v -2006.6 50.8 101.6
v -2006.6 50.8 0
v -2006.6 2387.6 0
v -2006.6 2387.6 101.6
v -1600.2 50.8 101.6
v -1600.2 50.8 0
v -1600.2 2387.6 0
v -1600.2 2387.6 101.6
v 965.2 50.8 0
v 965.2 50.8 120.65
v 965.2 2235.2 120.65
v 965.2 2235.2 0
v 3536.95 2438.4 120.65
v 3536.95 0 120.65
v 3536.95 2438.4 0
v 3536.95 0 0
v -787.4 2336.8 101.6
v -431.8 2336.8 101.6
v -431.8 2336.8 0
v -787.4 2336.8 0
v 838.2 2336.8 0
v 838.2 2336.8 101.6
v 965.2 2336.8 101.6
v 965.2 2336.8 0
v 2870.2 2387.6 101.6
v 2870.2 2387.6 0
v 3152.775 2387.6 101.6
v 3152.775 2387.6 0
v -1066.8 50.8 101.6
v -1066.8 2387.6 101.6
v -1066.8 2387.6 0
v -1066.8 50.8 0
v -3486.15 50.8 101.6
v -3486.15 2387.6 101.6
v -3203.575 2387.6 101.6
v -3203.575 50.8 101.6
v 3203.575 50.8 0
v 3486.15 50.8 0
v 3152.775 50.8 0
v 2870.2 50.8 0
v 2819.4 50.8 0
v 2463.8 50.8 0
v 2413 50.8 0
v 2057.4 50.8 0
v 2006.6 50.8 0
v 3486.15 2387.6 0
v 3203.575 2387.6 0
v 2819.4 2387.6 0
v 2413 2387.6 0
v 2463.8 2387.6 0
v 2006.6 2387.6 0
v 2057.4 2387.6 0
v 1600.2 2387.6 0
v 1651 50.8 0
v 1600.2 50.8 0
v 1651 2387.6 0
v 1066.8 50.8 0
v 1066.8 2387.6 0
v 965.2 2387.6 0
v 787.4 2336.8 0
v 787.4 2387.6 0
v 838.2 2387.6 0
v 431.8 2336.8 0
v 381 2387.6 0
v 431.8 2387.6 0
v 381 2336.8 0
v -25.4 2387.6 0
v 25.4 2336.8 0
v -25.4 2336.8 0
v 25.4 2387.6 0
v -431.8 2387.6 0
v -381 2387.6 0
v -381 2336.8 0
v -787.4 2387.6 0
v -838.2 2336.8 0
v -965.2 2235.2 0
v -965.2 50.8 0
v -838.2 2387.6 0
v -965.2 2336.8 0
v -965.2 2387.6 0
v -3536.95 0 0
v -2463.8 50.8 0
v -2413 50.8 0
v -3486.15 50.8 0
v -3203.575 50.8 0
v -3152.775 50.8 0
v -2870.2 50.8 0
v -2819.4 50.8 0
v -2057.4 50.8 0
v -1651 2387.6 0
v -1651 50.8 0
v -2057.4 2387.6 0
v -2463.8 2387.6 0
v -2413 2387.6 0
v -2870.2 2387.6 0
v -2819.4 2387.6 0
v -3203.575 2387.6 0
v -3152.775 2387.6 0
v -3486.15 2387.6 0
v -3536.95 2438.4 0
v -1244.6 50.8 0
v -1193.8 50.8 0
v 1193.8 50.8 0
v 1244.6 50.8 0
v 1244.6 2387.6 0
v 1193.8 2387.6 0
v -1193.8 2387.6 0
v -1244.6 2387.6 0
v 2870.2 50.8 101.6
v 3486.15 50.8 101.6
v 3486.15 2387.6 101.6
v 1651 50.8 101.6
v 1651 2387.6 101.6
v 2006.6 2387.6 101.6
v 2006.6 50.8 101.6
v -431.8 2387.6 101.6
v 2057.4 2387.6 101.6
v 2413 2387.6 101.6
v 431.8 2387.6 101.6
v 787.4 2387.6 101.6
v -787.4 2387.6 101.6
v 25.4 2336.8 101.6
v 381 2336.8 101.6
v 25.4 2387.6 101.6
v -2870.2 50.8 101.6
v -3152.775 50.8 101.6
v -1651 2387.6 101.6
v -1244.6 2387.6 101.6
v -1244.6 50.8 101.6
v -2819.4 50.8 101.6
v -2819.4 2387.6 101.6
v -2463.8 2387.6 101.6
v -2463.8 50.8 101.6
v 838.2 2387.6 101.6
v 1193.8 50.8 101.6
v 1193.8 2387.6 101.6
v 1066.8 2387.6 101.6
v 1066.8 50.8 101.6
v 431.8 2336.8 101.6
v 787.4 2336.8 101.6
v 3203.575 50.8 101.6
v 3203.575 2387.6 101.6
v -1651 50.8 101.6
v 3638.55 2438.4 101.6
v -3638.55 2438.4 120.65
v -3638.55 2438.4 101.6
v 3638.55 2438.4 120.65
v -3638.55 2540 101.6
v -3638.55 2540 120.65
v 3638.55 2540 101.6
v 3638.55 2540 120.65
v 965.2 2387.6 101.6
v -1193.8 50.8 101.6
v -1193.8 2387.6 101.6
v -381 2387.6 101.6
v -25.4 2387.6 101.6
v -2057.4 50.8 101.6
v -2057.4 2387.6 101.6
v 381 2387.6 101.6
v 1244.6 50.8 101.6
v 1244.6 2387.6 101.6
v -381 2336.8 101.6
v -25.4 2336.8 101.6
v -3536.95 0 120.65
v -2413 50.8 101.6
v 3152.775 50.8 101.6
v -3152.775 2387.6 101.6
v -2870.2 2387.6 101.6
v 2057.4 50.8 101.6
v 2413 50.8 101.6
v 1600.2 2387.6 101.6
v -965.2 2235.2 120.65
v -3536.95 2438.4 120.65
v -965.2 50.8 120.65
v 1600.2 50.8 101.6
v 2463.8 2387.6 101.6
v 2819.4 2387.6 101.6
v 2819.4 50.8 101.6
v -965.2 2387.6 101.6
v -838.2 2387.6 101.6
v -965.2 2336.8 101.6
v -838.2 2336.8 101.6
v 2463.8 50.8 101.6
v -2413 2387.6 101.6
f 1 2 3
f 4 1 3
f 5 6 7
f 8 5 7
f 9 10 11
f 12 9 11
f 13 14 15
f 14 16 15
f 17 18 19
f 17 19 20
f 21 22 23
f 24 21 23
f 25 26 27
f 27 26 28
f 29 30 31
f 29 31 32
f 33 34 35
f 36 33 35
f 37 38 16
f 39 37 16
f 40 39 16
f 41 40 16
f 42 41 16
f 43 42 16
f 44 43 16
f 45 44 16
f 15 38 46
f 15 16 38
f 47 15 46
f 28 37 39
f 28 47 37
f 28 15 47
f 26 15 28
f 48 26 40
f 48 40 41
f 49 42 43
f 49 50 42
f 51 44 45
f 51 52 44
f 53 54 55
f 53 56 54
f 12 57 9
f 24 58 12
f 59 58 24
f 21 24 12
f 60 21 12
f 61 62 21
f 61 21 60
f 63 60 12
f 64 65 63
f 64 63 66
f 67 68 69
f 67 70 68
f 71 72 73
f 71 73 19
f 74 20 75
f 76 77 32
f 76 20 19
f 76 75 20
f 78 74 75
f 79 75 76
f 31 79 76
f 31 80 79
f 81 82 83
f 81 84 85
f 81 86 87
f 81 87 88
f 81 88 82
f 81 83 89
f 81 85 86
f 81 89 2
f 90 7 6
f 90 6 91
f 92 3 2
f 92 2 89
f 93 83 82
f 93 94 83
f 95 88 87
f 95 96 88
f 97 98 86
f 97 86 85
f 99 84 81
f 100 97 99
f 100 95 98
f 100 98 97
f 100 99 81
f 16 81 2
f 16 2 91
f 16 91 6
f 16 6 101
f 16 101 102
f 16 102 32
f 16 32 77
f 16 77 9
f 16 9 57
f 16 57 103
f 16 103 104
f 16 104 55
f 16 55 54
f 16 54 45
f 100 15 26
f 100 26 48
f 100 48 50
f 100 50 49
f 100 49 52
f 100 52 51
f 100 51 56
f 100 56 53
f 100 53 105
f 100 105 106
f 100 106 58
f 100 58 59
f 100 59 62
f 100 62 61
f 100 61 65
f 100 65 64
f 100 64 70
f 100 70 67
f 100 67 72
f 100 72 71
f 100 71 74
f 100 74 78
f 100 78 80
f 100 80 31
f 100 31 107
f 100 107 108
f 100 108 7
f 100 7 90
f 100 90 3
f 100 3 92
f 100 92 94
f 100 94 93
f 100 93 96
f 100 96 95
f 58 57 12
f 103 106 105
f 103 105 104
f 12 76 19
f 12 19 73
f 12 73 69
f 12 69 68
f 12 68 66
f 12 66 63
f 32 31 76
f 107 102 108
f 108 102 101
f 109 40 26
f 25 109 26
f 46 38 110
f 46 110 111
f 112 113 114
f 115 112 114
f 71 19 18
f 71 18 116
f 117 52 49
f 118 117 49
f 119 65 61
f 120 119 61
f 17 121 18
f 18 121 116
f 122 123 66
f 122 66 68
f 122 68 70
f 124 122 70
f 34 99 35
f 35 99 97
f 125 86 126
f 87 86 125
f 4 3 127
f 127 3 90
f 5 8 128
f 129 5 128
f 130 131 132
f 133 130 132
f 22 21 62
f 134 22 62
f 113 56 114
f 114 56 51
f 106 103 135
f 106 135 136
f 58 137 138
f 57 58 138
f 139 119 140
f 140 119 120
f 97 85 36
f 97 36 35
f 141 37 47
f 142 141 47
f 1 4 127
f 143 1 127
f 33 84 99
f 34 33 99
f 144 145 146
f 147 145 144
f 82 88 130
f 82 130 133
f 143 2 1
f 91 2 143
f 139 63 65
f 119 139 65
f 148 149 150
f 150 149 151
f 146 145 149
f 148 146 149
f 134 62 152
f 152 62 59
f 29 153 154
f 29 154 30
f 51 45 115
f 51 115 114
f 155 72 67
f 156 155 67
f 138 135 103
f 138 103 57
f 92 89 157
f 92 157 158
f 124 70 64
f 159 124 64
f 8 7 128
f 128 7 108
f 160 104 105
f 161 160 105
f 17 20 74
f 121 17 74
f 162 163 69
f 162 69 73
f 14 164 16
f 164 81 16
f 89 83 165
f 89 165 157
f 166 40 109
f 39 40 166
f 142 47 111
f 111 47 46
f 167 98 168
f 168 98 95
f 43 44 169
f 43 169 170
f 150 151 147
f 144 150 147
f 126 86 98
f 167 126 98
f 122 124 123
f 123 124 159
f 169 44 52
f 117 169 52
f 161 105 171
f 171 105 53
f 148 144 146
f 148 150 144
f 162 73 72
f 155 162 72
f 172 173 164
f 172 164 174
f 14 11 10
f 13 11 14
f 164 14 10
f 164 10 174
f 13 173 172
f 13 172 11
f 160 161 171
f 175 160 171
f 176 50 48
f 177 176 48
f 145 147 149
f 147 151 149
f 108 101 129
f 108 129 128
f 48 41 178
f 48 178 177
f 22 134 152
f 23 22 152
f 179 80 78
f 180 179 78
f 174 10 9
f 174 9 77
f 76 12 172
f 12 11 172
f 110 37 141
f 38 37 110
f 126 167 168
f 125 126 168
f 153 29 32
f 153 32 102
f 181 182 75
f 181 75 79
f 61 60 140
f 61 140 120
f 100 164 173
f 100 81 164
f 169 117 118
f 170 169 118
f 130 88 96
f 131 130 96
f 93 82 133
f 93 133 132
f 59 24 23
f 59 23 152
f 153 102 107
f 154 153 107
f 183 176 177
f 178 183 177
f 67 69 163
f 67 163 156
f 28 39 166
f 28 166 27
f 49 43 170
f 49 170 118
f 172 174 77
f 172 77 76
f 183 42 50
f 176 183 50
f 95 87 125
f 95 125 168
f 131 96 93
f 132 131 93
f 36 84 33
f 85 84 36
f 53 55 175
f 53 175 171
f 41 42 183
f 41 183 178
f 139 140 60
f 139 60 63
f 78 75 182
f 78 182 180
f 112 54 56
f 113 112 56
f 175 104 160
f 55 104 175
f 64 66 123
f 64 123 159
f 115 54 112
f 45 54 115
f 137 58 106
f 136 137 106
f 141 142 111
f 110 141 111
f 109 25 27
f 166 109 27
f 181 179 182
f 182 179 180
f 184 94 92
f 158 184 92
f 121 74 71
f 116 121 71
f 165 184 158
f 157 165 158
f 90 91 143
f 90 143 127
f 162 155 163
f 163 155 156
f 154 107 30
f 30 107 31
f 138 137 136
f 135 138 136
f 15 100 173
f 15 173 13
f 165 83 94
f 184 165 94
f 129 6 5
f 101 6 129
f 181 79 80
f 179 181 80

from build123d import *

# Parameters (mm, degrees)
SKETCH1_W           = 355.6
SKETCH1_H           = 2336.8
SKETCH1_W_2         = 282.575
BOSS_EXTRUDE1_DEPTH = 101.6
SKETCH2_W           = 7073.9
SKETCH2_H           = 2438.4
BOSS_EXTRUDE2_DEPTH = 19.05
CUT_EXTRUDE1_DEPTH  = 4298.71640351
SKETCH4_W           = 355.6
SKETCH4_H           = 101.6
BOSS_EXTRUDE3_DEPTH = 101.6
BOSS_EXTRUDE5_DEPTH = 19.05


with BuildPart() as part:
    # Sketch1 → Boss-Extrude1 (new body)
    with BuildSketch(Plane.XY):
        Polygon((0, 0), (3536.95, 0), (3536.95, 2438.4), (-3536.95, 2438.4), (-3536.95, 0), align=None)
        with Locations((203.2, 1219.2)):
            Rectangle(SKETCH1_W, SKETCH1_H, mode=Mode.SUBTRACT)
        with Locations((-203.2, 1219.2)):
            Rectangle(SKETCH1_W, SKETCH1_H, mode=Mode.SUBTRACT)
        with Locations((609.6, 1219.2)):
            Rectangle(SKETCH1_W, SKETCH1_H, mode=Mode.SUBTRACT)
        with Locations((1016, 1219.2)):
            Rectangle(SKETCH1_W, SKETCH1_H, mode=Mode.SUBTRACT)
        with Locations((-3344.8625, 1219.2)):
            Rectangle(SKETCH1_W_2, SKETCH1_H, mode=Mode.SUBTRACT)
        with Locations((3344.8625, 1219.2)):
            Rectangle(SKETCH1_W_2, SKETCH1_H, mode=Mode.SUBTRACT)
        with Locations((1422.4, 1219.2)):
            Rectangle(SKETCH1_W, SKETCH1_H, mode=Mode.SUBTRACT)
        with Locations((1828.8, 1219.2)):
            Rectangle(SKETCH1_W, SKETCH1_H, mode=Mode.SUBTRACT)
        with Locations((2235.2, 1219.2)):
            Rectangle(SKETCH1_W, SKETCH1_H, mode=Mode.SUBTRACT)
        with Locations((2641.6, 1219.2)):
            Rectangle(SKETCH1_W, SKETCH1_H, mode=Mode.SUBTRACT)
        with Locations((3011.4875, 1219.2)):
            Rectangle(SKETCH1_W_2, SKETCH1_H, mode=Mode.SUBTRACT)
        with Locations((-609.6, 1219.2)):
            Rectangle(SKETCH1_W, SKETCH1_H, mode=Mode.SUBTRACT)
        with Locations((-1016, 1219.2)):
            Rectangle(SKETCH1_W, SKETCH1_H, mode=Mode.SUBTRACT)
        with Locations((-1422.4, 1219.2)):
            Rectangle(SKETCH1_W, SKETCH1_H, mode=Mode.SUBTRACT)
        with Locations((-1828.8, 1219.2)):
            Rectangle(SKETCH1_W, SKETCH1_H, mode=Mode.SUBTRACT)
        with Locations((-2235.2, 1219.2)):
            Rectangle(SKETCH1_W, SKETCH1_H, mode=Mode.SUBTRACT)
        with Locations((-2641.6, 1219.2)):
            Rectangle(SKETCH1_W, SKETCH1_H, mode=Mode.SUBTRACT)
        with Locations((-3011.4875, 1219.2)):
            Rectangle(SKETCH1_W_2, SKETCH1_H, mode=Mode.SUBTRACT)
    extrude(amount=BOSS_EXTRUDE1_DEPTH)

    # Sketch2 → Boss-Extrude2 (add)
    with BuildSketch(Plane.XY.offset(101.6)):
        with Locations((0, 1219.2)):
            Rectangle(SKETCH2_W, SKETCH2_H)
    extrude(amount=BOSS_EXTRUDE2_DEPTH)

    # Sketch3 → Cut-Extrude1 (cut, through all)
    with BuildSketch(Plane.XY.offset(120.65)):
        Polygon((0, 2235.2), (965.2, 2235.2), (965.2, 50.8), (-965.2, 50.8), (-965.2, 2235.2), align=None)
    extrude(amount=-CUT_EXTRUDE1_DEPTH, mode=Mode.SUBTRACT)

    # Sketch4 → Boss-Extrude3 (add)
    with BuildSketch(Plane(origin=(0, 0, 101.6), x_dir=(-1, 0, 0), z_dir=(0, 0, -1))):
        Polygon((-965.2, 2336.8), (-965.2, 2387.6), (-1066.8, 2387.6), (-1066.8, 50.8), (-965.2, 50.8), (-965.2, 2235.2), (-838.2, 2235.2), (-838.2, 2336.8), align=None)
        Polygon((965.2, 2336.8), (965.2, 2387.6), (1066.8, 2387.6), (1066.8, 50.8), (965.2, 50.8), (965.2, 2235.2), (838.2, 2235.2), (838.2, 2336.8), align=None)
        with Locations((-609.6, 2286)):
            Rectangle(SKETCH4_W, SKETCH4_H)
        with Locations((-203.2, 2286)):
            Rectangle(SKETCH4_W, SKETCH4_H)
        with Locations((203.2, 2286)):
            Rectangle(SKETCH4_W, SKETCH4_H)
        with Locations((609.6, 2286)):
            Rectangle(SKETCH4_W, SKETCH4_H)
    extrude(amount=BOSS_EXTRUDE3_DEPTH)


with BuildPart() as body_2:
    # Sketch5 → Boss-Extrude5 (new body)
    with BuildSketch(Plane.XY.offset(120.65)):
        Polygon((-3536.95, 2438.4), (-3638.55, 2438.4), (-3638.55, 2540), (3638.55, 2540), (3638.55, 2438.4), (3536.95, 2438.4), align=None)
    extrude(amount=-BOSS_EXTRUDE5_DEPTH)


solid = Compound([part.part, body_2.part])
